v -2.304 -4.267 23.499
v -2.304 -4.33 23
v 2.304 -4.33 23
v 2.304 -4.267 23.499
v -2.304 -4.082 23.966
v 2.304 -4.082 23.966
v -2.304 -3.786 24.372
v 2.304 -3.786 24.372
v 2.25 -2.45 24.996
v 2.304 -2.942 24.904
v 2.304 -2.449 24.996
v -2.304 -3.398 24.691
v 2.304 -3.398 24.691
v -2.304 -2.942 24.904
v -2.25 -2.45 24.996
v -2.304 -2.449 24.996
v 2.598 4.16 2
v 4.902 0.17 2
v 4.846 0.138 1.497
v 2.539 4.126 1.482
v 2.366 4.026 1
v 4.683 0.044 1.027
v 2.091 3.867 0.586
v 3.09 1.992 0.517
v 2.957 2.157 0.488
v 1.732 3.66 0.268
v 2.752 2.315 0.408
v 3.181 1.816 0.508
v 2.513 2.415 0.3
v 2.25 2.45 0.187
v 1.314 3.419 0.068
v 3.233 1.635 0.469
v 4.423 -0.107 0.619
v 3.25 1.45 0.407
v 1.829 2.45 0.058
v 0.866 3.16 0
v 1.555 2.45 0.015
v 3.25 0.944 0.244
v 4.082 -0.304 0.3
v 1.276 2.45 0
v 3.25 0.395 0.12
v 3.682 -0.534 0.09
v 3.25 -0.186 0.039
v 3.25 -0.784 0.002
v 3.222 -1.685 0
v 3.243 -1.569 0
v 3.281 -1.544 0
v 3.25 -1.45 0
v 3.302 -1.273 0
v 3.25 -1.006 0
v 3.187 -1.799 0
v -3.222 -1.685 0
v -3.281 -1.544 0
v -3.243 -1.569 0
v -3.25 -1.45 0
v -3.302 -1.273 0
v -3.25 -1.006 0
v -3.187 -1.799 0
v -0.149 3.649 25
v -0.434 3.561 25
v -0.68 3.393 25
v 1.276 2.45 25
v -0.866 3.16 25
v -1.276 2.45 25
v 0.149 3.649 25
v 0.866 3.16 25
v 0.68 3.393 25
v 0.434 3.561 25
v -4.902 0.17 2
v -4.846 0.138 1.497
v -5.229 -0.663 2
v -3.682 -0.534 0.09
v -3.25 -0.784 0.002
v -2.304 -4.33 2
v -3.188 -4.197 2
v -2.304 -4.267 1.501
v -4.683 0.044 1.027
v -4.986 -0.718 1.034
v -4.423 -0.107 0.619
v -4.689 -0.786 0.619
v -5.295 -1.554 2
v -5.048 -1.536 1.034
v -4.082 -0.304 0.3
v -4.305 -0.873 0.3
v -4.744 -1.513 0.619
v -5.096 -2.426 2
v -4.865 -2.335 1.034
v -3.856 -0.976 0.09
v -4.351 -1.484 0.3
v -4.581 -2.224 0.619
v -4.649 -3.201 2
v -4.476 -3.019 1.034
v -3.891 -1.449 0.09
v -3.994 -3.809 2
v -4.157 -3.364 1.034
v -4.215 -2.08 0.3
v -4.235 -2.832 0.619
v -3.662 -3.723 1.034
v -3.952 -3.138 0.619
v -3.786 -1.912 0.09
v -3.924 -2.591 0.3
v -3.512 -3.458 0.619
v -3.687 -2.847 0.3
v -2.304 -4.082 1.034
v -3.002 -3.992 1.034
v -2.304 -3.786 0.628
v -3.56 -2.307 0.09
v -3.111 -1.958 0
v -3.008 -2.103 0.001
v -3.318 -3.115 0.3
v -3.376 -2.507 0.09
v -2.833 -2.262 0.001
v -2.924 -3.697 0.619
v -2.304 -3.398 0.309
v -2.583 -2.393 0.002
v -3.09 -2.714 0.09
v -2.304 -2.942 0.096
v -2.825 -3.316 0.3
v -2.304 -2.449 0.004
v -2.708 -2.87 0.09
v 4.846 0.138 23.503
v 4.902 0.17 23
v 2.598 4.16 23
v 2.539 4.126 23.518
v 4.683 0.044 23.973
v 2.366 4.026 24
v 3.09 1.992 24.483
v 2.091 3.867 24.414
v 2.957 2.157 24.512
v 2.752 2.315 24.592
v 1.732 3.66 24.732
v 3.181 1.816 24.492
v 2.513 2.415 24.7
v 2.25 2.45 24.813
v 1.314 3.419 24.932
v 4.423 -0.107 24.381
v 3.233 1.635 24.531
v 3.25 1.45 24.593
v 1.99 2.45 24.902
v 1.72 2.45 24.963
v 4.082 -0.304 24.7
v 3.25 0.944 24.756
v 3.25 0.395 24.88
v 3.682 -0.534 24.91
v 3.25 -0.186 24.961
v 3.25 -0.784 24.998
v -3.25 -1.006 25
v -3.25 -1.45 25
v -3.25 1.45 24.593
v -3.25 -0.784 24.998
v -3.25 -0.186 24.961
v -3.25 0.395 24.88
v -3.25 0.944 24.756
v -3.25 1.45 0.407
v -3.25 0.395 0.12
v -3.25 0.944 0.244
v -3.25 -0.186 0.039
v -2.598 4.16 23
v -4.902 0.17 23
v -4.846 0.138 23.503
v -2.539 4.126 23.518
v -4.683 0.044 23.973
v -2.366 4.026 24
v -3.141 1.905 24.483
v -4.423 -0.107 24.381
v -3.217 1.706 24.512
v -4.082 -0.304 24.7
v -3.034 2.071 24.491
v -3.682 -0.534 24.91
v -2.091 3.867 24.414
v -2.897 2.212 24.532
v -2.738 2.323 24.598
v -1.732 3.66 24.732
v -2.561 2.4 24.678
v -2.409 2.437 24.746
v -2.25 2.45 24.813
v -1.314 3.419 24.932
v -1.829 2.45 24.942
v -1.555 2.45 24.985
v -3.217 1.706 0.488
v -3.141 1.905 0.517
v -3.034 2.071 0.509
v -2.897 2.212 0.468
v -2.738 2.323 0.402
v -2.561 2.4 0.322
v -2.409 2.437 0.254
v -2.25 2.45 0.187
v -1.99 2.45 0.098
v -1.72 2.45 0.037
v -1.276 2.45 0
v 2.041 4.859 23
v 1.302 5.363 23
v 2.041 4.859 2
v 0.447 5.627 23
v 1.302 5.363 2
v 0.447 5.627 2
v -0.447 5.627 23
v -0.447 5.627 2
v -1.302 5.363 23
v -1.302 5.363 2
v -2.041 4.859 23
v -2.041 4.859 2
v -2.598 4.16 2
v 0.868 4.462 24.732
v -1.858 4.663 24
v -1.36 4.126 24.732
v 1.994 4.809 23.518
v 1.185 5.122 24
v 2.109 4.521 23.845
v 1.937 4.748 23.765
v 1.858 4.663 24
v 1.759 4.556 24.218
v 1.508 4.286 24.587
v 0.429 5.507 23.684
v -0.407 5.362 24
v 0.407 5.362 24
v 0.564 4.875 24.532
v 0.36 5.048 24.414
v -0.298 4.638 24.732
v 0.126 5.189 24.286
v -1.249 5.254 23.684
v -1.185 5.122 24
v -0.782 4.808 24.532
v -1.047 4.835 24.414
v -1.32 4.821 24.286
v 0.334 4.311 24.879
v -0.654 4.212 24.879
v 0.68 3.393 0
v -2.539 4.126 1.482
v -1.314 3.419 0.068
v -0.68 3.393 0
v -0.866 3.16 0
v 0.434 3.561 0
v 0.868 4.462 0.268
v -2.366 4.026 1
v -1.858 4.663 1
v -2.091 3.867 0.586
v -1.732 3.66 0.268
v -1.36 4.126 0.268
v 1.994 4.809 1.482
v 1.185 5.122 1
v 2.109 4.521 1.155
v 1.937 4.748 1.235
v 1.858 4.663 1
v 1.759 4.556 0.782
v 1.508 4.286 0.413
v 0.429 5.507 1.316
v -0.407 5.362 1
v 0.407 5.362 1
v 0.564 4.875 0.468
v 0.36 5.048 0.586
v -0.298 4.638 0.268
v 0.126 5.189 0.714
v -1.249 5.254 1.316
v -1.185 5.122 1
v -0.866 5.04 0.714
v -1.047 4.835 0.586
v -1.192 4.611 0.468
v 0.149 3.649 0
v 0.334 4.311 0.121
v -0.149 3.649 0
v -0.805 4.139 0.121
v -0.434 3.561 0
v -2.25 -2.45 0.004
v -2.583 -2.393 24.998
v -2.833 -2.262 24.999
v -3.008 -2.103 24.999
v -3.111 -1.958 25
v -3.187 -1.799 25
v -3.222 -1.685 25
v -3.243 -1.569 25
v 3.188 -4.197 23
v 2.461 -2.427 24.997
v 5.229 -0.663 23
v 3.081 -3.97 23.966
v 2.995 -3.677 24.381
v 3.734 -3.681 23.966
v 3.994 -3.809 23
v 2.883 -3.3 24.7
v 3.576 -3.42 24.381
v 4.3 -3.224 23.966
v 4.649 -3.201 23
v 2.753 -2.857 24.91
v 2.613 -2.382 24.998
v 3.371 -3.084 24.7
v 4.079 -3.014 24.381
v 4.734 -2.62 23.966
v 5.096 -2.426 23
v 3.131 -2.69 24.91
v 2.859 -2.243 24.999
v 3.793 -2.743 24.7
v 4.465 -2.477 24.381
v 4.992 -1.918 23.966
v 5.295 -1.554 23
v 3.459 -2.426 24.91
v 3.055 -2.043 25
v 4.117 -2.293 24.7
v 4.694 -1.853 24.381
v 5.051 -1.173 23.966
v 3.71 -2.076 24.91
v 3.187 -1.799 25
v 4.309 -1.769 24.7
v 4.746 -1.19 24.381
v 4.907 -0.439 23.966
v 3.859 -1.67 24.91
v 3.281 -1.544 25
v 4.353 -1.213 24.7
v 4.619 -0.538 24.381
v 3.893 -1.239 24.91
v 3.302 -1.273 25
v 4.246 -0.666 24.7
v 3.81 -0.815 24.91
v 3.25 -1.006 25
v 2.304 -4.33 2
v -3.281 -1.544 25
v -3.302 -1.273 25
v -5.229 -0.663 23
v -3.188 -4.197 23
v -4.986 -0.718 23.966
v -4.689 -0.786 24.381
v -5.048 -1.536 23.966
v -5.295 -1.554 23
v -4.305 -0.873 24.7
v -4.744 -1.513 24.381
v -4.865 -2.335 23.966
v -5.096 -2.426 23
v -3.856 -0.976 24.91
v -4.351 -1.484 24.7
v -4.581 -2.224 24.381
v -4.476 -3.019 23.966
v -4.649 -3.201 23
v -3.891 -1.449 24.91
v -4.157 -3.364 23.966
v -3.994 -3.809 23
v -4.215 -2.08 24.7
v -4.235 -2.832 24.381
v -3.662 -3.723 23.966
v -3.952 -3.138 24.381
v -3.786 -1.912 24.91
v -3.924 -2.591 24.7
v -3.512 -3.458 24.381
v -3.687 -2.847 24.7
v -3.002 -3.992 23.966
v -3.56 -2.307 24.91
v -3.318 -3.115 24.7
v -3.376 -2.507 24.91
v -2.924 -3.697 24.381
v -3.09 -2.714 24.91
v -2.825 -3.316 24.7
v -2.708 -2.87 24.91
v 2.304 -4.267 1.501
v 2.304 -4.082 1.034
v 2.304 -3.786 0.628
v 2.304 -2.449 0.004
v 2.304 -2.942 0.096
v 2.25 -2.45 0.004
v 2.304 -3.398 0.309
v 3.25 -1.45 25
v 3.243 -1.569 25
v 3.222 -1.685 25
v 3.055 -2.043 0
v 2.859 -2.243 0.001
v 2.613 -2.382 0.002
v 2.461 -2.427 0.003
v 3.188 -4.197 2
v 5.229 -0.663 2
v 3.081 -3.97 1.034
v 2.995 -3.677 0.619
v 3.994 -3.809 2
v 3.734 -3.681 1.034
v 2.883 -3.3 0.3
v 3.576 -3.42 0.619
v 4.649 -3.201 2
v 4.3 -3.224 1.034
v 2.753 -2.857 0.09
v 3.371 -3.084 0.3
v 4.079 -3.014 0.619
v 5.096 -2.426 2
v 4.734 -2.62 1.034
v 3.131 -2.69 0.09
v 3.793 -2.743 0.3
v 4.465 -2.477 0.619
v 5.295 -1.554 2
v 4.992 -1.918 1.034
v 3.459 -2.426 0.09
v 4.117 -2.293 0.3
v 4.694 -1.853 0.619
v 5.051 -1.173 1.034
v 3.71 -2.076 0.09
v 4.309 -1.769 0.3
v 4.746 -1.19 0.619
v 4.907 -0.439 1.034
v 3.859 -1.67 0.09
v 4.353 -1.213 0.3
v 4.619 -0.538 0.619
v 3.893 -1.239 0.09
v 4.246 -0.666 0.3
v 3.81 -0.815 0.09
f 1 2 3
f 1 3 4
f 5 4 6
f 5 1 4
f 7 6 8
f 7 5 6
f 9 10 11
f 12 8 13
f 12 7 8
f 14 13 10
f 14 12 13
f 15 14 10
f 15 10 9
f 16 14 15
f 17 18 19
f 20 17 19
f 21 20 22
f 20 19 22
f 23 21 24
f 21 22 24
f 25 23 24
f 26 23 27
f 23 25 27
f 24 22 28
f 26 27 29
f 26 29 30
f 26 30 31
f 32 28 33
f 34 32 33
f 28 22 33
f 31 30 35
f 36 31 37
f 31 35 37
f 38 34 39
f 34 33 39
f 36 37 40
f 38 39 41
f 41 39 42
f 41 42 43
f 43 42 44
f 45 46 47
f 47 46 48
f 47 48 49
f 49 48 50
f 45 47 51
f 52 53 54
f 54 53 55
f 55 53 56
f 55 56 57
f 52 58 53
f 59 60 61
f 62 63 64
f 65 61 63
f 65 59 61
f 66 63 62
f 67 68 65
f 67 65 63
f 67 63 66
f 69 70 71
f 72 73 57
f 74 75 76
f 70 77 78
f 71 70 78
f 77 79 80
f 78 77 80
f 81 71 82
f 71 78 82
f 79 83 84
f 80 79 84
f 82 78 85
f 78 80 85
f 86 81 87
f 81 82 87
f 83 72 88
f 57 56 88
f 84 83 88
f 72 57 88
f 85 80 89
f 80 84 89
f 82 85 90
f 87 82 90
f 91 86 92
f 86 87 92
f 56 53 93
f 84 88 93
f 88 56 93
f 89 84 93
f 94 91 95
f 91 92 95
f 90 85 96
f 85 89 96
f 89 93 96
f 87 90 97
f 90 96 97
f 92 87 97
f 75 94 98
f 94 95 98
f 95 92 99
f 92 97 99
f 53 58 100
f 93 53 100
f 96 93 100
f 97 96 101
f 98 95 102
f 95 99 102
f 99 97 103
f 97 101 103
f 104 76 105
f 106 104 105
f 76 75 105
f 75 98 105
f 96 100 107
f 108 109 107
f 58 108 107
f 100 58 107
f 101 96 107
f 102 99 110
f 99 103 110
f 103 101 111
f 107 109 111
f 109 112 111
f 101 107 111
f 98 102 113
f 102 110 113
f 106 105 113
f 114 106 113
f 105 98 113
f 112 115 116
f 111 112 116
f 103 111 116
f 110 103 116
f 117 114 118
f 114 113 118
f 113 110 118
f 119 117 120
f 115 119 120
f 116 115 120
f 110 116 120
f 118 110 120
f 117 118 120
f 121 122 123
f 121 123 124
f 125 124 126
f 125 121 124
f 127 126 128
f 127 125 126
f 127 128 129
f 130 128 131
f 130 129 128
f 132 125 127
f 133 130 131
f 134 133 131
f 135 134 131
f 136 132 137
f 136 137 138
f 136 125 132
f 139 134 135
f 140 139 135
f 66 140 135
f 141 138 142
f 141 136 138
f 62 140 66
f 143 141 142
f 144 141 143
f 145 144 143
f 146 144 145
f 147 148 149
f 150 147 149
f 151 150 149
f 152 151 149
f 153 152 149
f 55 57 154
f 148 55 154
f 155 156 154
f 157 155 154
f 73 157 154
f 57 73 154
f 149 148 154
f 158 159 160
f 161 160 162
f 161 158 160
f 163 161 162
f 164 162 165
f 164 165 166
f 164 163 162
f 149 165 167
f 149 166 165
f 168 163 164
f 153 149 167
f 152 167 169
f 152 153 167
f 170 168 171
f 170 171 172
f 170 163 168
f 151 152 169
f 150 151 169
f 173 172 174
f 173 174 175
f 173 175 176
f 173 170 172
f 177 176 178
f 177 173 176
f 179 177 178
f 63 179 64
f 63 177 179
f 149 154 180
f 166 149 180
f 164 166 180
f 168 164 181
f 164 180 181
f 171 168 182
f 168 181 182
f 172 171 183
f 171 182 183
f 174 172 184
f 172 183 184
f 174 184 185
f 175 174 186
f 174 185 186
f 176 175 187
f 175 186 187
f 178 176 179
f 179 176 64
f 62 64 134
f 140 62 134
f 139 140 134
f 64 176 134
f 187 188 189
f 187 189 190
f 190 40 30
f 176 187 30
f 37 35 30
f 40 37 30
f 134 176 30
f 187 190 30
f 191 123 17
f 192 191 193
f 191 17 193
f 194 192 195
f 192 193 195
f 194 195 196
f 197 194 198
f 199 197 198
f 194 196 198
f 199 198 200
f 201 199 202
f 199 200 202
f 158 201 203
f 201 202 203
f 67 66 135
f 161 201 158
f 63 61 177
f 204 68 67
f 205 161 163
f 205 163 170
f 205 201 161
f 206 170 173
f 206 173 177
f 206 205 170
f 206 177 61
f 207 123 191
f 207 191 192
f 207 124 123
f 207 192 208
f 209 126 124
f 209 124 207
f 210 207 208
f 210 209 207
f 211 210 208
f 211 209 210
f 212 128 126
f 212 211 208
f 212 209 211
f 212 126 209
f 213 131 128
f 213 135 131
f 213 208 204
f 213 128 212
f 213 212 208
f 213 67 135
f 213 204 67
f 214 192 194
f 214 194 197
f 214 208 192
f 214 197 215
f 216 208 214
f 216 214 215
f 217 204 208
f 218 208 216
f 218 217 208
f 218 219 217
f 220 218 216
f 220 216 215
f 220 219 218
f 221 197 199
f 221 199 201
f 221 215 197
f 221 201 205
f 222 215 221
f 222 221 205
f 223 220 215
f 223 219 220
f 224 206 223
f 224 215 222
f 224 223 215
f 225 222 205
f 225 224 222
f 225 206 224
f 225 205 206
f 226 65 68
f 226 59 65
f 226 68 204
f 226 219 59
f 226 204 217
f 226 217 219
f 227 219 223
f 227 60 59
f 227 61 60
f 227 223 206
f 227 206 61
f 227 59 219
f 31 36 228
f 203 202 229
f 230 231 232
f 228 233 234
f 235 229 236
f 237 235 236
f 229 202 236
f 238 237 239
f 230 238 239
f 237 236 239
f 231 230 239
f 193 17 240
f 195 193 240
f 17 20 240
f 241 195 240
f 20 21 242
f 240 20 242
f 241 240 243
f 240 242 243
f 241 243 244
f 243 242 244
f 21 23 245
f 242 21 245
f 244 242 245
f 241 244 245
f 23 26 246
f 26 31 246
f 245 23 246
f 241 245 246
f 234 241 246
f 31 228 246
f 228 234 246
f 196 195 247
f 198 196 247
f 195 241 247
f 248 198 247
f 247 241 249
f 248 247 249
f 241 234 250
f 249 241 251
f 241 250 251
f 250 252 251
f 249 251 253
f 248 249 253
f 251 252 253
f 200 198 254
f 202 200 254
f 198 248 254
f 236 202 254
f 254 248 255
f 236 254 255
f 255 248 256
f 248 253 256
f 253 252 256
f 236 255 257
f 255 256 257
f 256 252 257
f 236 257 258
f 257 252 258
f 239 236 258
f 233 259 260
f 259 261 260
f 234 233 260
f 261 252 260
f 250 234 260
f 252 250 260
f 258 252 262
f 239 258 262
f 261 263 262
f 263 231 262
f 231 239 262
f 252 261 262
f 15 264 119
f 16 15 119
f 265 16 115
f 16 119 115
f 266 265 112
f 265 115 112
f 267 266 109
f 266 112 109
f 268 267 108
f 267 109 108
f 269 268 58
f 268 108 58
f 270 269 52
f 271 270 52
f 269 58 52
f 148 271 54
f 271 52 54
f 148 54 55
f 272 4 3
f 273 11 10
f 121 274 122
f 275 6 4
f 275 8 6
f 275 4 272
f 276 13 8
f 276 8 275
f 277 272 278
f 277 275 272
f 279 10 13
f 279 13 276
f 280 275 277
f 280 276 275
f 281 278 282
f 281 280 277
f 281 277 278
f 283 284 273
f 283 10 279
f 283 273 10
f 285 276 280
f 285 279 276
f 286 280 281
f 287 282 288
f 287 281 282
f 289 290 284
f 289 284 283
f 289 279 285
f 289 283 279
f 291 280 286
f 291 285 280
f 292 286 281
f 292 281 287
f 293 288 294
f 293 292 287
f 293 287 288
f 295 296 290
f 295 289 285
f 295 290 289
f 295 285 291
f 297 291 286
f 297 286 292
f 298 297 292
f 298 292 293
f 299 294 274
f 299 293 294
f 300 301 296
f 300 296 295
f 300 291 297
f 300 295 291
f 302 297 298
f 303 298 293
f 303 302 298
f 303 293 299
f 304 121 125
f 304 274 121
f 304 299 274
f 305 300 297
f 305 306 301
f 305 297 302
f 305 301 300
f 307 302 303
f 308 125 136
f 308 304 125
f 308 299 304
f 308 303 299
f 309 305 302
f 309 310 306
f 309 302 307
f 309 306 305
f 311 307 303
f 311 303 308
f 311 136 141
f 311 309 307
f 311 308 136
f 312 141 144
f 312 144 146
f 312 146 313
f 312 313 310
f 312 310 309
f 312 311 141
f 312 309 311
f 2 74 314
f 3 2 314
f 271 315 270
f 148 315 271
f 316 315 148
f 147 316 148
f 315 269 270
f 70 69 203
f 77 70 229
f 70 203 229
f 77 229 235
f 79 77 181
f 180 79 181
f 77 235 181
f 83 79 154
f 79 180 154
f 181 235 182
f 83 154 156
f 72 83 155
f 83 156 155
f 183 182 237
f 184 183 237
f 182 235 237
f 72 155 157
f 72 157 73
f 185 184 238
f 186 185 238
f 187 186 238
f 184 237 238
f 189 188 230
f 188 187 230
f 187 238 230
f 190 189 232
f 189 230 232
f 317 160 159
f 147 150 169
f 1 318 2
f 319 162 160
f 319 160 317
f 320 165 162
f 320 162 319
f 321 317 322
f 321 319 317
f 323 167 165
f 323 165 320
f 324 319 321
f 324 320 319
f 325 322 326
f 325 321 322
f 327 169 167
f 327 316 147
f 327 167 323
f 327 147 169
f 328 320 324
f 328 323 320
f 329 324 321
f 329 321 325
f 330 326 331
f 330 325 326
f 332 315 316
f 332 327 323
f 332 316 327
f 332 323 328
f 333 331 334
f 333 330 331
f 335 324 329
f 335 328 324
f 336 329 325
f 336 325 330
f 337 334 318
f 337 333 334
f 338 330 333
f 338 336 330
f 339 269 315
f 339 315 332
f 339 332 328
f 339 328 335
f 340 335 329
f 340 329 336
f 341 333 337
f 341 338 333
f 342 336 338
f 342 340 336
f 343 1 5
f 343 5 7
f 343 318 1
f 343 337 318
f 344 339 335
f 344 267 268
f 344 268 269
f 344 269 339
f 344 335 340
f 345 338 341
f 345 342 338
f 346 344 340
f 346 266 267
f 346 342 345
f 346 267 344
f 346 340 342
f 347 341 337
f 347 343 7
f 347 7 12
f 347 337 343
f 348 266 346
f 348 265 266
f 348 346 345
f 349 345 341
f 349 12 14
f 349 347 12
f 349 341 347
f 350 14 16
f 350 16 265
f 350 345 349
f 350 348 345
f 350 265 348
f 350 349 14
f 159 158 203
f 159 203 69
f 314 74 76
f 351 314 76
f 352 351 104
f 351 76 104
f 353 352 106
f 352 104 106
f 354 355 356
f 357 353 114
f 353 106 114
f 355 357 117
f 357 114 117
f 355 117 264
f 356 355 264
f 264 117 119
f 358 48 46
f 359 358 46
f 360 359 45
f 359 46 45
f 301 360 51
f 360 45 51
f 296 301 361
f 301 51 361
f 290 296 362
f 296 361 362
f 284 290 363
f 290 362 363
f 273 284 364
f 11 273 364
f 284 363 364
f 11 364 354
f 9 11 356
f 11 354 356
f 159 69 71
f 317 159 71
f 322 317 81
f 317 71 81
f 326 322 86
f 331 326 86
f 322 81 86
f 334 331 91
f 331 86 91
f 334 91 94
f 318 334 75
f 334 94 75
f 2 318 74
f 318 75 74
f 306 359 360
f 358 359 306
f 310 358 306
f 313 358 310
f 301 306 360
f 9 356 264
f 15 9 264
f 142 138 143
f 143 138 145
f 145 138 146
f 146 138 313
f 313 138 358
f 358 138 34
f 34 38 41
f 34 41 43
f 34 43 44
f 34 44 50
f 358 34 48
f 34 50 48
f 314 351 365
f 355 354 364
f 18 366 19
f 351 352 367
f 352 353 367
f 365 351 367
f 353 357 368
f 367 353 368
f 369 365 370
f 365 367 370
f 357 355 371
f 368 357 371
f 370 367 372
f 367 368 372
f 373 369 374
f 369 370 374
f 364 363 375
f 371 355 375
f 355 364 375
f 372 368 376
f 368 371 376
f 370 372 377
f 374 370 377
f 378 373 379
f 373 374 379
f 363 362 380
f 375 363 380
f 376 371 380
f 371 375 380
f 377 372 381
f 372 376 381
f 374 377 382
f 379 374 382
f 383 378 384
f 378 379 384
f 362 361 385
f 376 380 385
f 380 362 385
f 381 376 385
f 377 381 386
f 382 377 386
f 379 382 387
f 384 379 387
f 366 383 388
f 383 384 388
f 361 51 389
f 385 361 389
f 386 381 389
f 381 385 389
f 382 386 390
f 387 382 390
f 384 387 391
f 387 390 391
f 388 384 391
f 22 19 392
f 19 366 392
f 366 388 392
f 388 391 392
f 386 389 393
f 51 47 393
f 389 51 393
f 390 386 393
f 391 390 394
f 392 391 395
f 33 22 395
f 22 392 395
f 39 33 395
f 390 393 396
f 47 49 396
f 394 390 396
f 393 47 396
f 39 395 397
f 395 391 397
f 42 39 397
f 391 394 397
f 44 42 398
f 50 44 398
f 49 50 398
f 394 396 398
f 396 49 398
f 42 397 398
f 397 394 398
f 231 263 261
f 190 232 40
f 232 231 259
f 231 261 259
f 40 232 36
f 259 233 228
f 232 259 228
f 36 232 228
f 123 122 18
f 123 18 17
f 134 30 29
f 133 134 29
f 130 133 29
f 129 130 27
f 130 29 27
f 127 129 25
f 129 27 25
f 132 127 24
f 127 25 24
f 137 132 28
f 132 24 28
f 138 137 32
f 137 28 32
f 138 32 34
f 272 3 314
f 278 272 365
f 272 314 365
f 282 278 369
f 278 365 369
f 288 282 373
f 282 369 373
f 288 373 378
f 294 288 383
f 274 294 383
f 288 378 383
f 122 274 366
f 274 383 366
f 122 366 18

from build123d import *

# Parameters (mm, degrees)
F1_DEPTH     = 25
F2_T1_DEPTH  = 4.6076951546
F2_T3_DEPTH  = 4.6076951546
F2_T5_DEPTH  = 4.6076951546
F2_T8_ANGLE  = 120
F2_T10_ANGLE = 120
F2_T12_ANGLE = 120
F2_T14_ANGLE = 120
F2_T16_ANGLE = 120
F2_T18_ANGLE = 120


# Not quite as in the source:
# - a fillet or chamfer that OpenCascade refuses, or shapes differently, is made with other operations: its cross-section is extruded or revolved along the edge and cut away or added


with BuildPart() as f1:
    # F0 (on Top) → F1 (new body)
    with BuildSketch(Plane.XY):
        with BuildLine():
            Line((-2.3038475773, -4.3301270189), (2.3038475773, -4.3301270189))
            ThreePointArc((2.3038475773, -4.3301270189), (4.9019237886, -2.8301270189), (4.9019237886, 0.1698729811))
            Line((4.9019237886, 0.1698729811), (2.5980762114, 4.1602540378))
            ThreePointArc((2.5980762114, 4.1602540378), (0, 5.6602540378), (-2.5980762114, 4.1602540378))
            Line((-2.5980762114, 4.1602540378), (-4.9019237886, 0.1698729811))
            ThreePointArc((-4.9019237886, 0.1698729811), (-4.9019237886, -2.8301270189), (-2.3038475773, -4.3301270189))
        make_face()
        with BuildLine():
            ThreePointArc((3.25, -1.45), (2.9571067812, -2.1571067812), (2.25, -2.45))
            Line((2.25, -2.45), (-2.25, -2.45))
            ThreePointArc((-2.25, -2.45), (-2.9571067812, -2.1571067812), (-3.25, -1.45))
            Line((-3.25, -1.45), (-3.25, 1.45))
            ThreePointArc((-3.25, 1.45), (-2.9571067812, 2.1571067812), (-2.25, 2.45))
            Line((-2.25, 2.45), (2.25, 2.45))
            ThreePointArc((2.25, 2.45), (2.9571067812, 2.1571067812), (3.25, 1.45))
            Line((3.25, 1.45), (3.25, -1.45))
        make_face(mode=Mode.SUBTRACT)
    extrude(amount=F1_DEPTH)

    # F2: fillet of radius 2 on 12 edges, made by hand

    # F2_s2 → F2_t1 (cut)
    with BuildSketch(Plane(origin=(1.1519237886, -1.9951905284, 0), x_dir=(0, 0, 1), z_dir=(-0.5, 0.8660254038, 0))):
        with BuildLine():
            ThreePointArc((23, 4.3301270189), (24.4142135624, 3.7443405813), (25, 2.3301270189))
            Line((25, 2.3301270189), (25, 4.3301270189))
            Line((25, 4.3301270189), (23, 4.3301270189))
        make_face()
        with BuildLine():
            ThreePointArc((2, 4.3301270189), (0.5857864376, 3.7443405813), (0, 2.3301270189))
            Line((0, 2.3301270189), (0, 4.3301270189))
            Line((0, 4.3301270189), (2, 4.3301270189))
        make_face()
    extrude(amount=F2_T1_DEPTH, mode=Mode.SUBTRACT)

    # F2_s4 → F2_t3 (cut)
    with BuildSketch(Plane(origin=(1.1519237886, 1.9951905284, 0), x_dir=(0, 0, 1), z_dir=(-0.5, -0.8660254038, 0))):
        with BuildLine():
            ThreePointArc((23, 4.3301270189), (24.4142135624, 3.7443405813), (25, 2.3301270189))
            Line((25, 2.3301270189), (25, 4.3301270189))
            Line((25, 4.3301270189), (23, 4.3301270189))
        make_face()
        with BuildLine():
            ThreePointArc((2, 4.3301270189), (0.5857864376, 3.7443405813), (0, 2.3301270189))
            Line((0, 2.3301270189), (0, 4.3301270189))
            Line((0, 4.3301270189), (2, 4.3301270189))
        make_face()
    extrude(amount=F2_T3_DEPTH, mode=Mode.SUBTRACT)

    # F2_s6 → F2_t5 (cut)
    with BuildSketch(Plane.YZ.offset(-2.3038475773)):
        with BuildLine():
            ThreePointArc((-4.3301270189, 23), (-3.7443405813, 24.4142135624), (-2.3301270189, 25))
            Line((-2.3301270189, 25), (-4.3301270189, 25))
            Line((-4.3301270189, 25), (-4.3301270189, 23))
        make_face()
        with BuildLine():
            ThreePointArc((-4.3301270189, 2), (-3.7443405813, 0.5857864376), (-2.3301270189, 0))
            Line((-2.3301270189, 0), (-4.3301270189, 0))
            Line((-4.3301270189, 0), (-4.3301270189, 2))
        make_face()
    extrude(amount=F2_T5_DEPTH, mode=Mode.SUBTRACT)

    # F2_s7 → F2_t8 (revolve, cut)
    with BuildSketch(Plane(origin=(-1.1519237886, 1.9951905284, 0), x_dir=(0, 0, 1), z_dir=(0.5, -0.8660254038, 0))):
        with BuildLine():
            ThreePointArc((23, -4.3301270189), (24.4142135624, -3.7443405813), (25, -2.3301270189))
            Line((25, -2.3301270189), (25, -4.3301270189))
            Line((25, -4.3301270189), (23, -4.3301270189))
        make_face()
    revolve(axis=Axis((0, 2.6602540378, 25), (0, 0, 1)), revolution_arc=F2_T8_ANGLE, mode=Mode.SUBTRACT)

    # F2_s9 → F2_t10 (revolve, cut)
    with BuildSketch(Plane(origin=(-1.1519237886, -1.9951905284, 0), x_dir=(0, 0, 1), z_dir=(0.5, 0.8660254038, 0))):
        with BuildLine():
            ThreePointArc((23, -4.3301270189), (24.4142135624, -3.7443405813), (25, -2.3301270189))
            Line((25, -2.3301270189), (25, -4.3301270189))
            Line((25, -4.3301270189), (23, -4.3301270189))
        make_face()
    revolve(axis=Axis((-2.3038475773, -1.3301270189, 25), (0, 0, 1)), revolution_arc=F2_T10_ANGLE, mode=Mode.SUBTRACT)

    # F2_s11 → F2_t12 (revolve, cut)
    with BuildSketch(Plane.YZ.offset(2.3038475773)):
        with BuildLine():
            ThreePointArc((-4.3301270189, 23), (-3.7443405813, 24.4142135624), (-2.3301270189, 25))
            Line((-2.3301270189, 25), (-4.3301270189, 25))
            Line((-4.3301270189, 25), (-4.3301270189, 23))
        make_face()
    revolve(axis=Axis((2.3038475773, -1.3301270189, 25), (0, 0, 1)), revolution_arc=F2_T12_ANGLE, mode=Mode.SUBTRACT)

    # F2_s13 → F2_t14 (revolve, cut)
    with BuildSketch(Plane.YZ.offset(2.3038475773)):
        with BuildLine():
            ThreePointArc((-4.3301270189, 2), (-3.7443405813, 0.5857864376), (-2.3301270189, 0))
            Line((-2.3301270189, 0), (-4.3301270189, 0))
            Line((-4.3301270189, 0), (-4.3301270189, 2))
        make_face()
    revolve(axis=Axis((2.3038475773, -1.3301270189, 0), (0, 0, 1)), revolution_arc=F2_T14_ANGLE, mode=Mode.SUBTRACT)

    # F2_s15 → F2_t16 (revolve, cut)
    with BuildSketch(Plane(origin=(-1.1519237886, 1.9951905284, 0), x_dir=(0, 0, 1), z_dir=(0.5, -0.8660254038, 0))):
        with BuildLine():
            ThreePointArc((2, -4.3301270189), (0.5857864376, -3.7443405813), (0, -2.3301270189))
            Line((0, -2.3301270189), (0, -4.3301270189))
            Line((0, -4.3301270189), (2, -4.3301270189))
        make_face()
    revolve(axis=Axis((0, 2.6602540378, 0), (0, 0, 1)), revolution_arc=F2_T16_ANGLE, mode=Mode.SUBTRACT)

    # F2_s17 → F2_t18 (revolve, cut)
    with BuildSketch(Plane(origin=(-1.1519237886, -1.9951905284, 0), x_dir=(0, 0, 1), z_dir=(0.5, 0.8660254038, 0))):
        with BuildLine():
            ThreePointArc((2, -4.3301270189), (0.5857864376, -3.7443405813), (0, -2.3301270189))
            Line((0, -2.3301270189), (0, -4.3301270189))
            Line((0, -4.3301270189), (2, -4.3301270189))
        make_face()
    revolve(axis=Axis((-2.3038475773, -1.3301270189, 0), (0, 0, 1)), revolution_arc=F2_T18_ANGLE, mode=Mode.SUBTRACT)


solid = f1.part
